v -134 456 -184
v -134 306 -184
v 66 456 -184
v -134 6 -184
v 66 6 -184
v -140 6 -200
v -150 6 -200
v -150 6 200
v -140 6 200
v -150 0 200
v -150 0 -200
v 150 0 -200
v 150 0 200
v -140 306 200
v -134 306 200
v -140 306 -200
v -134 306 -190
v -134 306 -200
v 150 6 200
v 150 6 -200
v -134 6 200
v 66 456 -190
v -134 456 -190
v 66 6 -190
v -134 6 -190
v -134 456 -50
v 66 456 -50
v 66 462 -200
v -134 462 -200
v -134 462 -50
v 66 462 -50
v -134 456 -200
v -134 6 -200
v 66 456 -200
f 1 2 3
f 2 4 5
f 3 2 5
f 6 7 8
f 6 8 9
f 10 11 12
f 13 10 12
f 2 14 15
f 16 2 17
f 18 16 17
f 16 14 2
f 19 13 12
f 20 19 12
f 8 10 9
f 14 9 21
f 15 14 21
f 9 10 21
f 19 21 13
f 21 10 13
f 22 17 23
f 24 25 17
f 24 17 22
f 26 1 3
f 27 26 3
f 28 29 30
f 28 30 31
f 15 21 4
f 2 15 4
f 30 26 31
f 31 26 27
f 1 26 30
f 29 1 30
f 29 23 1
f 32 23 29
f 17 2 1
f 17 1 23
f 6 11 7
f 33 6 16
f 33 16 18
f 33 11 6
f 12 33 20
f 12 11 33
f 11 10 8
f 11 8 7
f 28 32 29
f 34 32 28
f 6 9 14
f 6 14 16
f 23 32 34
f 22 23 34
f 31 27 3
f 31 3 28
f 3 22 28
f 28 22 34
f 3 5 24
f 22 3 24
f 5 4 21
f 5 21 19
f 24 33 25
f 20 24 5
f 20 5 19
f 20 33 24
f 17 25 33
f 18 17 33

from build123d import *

# Parameters (mm, degrees)
SKETCH1_W           = 300
SKETCH1_H           = 400
BOSS_EXTRUDE1_DEPTH = 6
SKETCH2_W           = 6
SKETCH2_H           = 400
BOSS_EXTRUDE2_DEPTH = 300
SKETCH3_W           = 200
SKETCH3_H           = 6
BOSS_EXTRUDE3_DEPTH = 450
SKETCH5_W           = 200
SKETCH5_H           = 150
BOSS_EXTRUDE4_DEPTH = 6


with BuildPart() as part:
    # Sketch1 → Boss-Extrude1 (new body)
    with BuildSketch(Plane(origin=(0, 0, 0), x_dir=(1, 0, 0), z_dir=(0, 1, 0))):
        Rectangle(SKETCH1_W, SKETCH1_H)
    extrude(amount=BOSS_EXTRUDE1_DEPTH)

    # Sketch2 → Boss-Extrude2 (add)
    with BuildSketch(Plane(origin=(0, 6, 0), x_dir=(1, 0, 0), z_dir=(0, 1, 0))):
        with Locations((-137, 0)):
            Rectangle(SKETCH2_W, SKETCH2_H)
    extrude(amount=BOSS_EXTRUDE2_DEPTH)

    # Sketch3 → Boss-Extrude3 (add)
    with BuildSketch(Plane(origin=(0, 6, 0), x_dir=(1, 0, 0), z_dir=(0, 1, 0))):
        with Locations((-34, 187)):
            Rectangle(SKETCH3_W, SKETCH3_H)
    extrude(amount=BOSS_EXTRUDE3_DEPTH)

    # Sketch5 → Boss-Extrude4 (add)
    with BuildSketch(Plane(origin=(0, 456, 0), x_dir=(1, 0, 0), z_dir=(0, 1, 0))):
        with Locations((-34, 125)):
            Rectangle(SKETCH5_W, SKETCH5_H)
    extrude(amount=BOSS_EXTRUDE4_DEPTH)


solid = part.part
